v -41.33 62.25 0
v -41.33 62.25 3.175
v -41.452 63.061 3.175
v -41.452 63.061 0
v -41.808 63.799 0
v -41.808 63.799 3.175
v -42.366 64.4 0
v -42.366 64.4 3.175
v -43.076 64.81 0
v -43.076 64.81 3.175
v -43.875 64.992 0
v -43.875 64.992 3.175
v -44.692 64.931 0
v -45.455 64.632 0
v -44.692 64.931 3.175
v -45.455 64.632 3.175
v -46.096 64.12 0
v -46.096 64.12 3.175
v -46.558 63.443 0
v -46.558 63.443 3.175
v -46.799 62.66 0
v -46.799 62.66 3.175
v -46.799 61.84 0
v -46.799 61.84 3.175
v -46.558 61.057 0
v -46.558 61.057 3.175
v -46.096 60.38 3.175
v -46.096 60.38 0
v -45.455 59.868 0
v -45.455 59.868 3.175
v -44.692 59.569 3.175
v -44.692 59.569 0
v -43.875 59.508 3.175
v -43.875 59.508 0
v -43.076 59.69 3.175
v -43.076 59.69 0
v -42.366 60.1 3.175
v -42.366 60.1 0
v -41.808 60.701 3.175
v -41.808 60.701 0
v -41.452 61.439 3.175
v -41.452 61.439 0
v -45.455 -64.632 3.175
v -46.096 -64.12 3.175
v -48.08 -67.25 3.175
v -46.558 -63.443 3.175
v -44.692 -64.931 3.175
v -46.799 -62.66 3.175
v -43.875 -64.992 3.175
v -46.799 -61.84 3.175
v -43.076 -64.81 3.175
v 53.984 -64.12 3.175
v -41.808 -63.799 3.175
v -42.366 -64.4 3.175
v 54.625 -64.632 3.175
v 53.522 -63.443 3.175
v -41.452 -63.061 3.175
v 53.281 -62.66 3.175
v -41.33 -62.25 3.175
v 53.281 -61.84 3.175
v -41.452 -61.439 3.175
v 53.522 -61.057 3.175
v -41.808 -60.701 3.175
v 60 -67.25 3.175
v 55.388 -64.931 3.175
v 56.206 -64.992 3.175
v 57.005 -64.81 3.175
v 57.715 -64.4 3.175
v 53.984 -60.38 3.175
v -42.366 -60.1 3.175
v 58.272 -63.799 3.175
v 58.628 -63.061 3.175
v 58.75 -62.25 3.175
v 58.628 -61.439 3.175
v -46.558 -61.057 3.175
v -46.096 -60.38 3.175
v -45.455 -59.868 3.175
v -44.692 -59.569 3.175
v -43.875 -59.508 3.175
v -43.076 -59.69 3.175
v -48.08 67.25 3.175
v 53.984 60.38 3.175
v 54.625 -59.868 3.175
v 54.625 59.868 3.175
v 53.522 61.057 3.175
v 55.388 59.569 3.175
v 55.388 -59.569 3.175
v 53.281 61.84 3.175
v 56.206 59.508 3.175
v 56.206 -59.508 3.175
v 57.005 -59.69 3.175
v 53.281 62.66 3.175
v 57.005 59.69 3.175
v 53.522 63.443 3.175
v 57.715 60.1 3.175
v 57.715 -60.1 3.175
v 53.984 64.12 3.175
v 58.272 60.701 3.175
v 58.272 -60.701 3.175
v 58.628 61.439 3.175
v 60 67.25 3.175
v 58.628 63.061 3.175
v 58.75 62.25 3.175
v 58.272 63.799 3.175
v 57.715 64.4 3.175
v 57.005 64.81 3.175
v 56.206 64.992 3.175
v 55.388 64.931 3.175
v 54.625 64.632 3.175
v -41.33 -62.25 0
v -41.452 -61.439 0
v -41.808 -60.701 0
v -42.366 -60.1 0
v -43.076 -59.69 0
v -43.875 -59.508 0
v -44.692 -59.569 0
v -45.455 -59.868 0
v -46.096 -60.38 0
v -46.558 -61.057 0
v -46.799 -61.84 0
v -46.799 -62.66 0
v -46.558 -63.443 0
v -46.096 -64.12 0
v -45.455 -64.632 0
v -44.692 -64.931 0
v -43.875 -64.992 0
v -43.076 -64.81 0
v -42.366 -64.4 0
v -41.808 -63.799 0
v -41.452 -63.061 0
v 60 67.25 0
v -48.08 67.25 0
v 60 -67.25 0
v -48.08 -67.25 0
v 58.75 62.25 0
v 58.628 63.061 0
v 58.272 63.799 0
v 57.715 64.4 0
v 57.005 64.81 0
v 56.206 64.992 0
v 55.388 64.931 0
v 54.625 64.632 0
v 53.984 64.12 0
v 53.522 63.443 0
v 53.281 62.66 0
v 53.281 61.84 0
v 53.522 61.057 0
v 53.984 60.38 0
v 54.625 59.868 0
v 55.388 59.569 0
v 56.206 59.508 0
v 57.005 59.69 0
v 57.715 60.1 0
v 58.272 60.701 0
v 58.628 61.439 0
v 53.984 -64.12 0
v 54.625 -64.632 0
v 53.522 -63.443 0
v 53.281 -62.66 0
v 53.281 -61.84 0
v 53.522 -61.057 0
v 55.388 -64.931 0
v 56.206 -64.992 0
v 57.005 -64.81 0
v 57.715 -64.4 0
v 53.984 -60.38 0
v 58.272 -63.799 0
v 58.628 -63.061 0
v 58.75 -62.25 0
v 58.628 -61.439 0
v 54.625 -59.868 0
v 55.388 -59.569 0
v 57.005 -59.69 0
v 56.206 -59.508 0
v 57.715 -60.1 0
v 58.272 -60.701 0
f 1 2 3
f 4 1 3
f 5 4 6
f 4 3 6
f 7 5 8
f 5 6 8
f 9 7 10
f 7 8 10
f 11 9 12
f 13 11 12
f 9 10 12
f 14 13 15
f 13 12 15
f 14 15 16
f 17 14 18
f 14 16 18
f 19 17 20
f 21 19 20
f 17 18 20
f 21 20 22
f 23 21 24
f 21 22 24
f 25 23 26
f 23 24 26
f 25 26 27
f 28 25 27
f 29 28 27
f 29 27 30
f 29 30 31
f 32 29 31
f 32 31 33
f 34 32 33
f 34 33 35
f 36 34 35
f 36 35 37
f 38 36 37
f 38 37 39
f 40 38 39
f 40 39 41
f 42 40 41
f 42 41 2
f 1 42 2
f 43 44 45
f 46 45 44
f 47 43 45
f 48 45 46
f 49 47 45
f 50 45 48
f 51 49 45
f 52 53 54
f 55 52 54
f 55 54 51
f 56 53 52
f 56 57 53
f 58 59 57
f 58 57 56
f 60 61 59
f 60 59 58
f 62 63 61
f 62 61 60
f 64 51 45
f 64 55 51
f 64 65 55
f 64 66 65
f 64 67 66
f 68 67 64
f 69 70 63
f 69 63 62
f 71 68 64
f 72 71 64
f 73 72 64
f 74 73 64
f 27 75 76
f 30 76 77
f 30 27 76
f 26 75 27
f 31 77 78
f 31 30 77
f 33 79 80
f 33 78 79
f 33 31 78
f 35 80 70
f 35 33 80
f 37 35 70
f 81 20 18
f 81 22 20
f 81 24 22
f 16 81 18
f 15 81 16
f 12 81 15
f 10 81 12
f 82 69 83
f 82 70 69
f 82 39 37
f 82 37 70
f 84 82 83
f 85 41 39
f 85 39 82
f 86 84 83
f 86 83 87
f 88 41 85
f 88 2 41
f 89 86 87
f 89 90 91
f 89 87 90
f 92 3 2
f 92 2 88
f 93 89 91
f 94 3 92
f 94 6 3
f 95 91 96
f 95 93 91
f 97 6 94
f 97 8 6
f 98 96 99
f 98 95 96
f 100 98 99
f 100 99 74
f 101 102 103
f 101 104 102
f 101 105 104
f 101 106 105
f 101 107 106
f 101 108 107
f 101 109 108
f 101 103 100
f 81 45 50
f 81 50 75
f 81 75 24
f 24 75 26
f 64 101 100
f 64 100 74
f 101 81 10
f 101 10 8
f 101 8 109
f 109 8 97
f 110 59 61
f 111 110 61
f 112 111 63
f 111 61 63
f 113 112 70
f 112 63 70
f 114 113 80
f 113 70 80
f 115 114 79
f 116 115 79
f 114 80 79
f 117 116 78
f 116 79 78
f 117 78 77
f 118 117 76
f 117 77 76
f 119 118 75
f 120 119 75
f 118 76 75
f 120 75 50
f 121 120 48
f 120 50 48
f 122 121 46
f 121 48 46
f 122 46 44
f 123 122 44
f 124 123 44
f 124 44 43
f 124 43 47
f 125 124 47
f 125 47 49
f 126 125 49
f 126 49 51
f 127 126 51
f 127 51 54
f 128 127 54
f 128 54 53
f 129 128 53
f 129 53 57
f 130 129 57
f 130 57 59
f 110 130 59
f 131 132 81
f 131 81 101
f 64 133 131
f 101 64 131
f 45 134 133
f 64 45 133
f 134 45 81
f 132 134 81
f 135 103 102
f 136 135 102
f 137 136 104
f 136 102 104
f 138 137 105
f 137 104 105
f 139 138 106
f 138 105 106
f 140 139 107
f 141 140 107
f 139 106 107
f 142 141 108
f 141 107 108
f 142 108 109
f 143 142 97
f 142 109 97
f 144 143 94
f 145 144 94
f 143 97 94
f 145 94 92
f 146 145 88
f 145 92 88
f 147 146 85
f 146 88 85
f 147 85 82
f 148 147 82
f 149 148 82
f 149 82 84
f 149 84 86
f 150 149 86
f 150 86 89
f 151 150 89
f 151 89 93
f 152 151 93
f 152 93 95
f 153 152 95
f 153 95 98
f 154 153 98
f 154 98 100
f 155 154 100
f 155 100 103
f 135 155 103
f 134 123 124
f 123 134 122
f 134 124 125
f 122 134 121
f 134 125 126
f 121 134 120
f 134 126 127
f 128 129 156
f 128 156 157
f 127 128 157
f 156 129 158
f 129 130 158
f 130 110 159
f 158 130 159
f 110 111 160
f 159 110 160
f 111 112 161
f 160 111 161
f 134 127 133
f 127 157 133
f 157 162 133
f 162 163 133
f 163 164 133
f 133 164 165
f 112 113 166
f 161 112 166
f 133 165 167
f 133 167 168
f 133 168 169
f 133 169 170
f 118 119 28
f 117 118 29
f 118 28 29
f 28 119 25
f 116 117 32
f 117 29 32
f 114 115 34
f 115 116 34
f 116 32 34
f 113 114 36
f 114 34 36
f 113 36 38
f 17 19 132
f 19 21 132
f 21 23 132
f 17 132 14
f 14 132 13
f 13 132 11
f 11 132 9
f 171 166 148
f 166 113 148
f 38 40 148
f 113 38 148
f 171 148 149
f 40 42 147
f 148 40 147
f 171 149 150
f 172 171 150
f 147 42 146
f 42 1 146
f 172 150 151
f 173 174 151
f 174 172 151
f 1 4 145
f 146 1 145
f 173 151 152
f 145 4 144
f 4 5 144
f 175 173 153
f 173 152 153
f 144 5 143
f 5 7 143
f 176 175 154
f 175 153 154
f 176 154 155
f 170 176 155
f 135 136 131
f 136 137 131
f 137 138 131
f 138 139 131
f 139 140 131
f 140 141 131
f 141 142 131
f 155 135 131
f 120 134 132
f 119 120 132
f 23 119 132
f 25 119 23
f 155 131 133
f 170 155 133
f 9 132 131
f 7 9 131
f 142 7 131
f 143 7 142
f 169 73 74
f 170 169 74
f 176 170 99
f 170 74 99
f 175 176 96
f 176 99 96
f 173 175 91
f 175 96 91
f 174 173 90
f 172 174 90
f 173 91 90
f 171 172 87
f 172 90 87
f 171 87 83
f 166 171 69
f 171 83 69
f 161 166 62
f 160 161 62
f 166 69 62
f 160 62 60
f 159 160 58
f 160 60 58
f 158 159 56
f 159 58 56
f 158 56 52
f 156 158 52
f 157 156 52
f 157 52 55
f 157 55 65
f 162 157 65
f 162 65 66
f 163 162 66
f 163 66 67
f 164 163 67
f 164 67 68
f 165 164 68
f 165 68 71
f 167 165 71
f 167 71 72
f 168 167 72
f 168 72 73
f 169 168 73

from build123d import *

# Parameters (mm, degrees)
SKETCH1_W           = 120
SKETCH1_H           = 134.5
BOSS_EXTRUDE1_DEPTH = 3.175
CUT_EXTRUDE1_REACH  = 92.181
SKETCH2_W           = 11.91979388
SKETCH2_H           = 134.5
SKETCH2_R           = 2.75


with BuildPart() as part:
    # Sketch1 → Boss-Extrude1 (new body)
    with BuildSketch(Plane.XY):
        Rectangle(SKETCH1_W, SKETCH1_H)
    extrude(amount=BOSS_EXTRUDE1_DEPTH)

    # Sketch2 → Cut-Extrude1 (cut, up to next)
    with BuildSketch(Plane.XY.offset(3.175), mode=Mode.PRIVATE) as cut_extrude1_sk1:
        with Locations((-54.04010306, 0)):
            Rectangle(SKETCH2_W, SKETCH2_H)
    cut_extrude1_tool1 = extrude(cut_extrude1_sk1.sketch, amount=-CUT_EXTRUDE1_REACH, mode=Mode.PRIVATE) & part.part
    # Sketch2 → Cut-Extrude1 (cut, up to next)
    with BuildSketch(Plane.XY.offset(3.175), mode=Mode.PRIVATE) as cut_extrude1_sk2:
        with Locations((-44.08020612, 62.25)):
            Circle(SKETCH2_R)
    cut_extrude1_tool2 = extrude(cut_extrude1_sk2.sketch, amount=-CUT_EXTRUDE1_REACH, mode=Mode.PRIVATE) & part.part
    # Sketch2 → Cut-Extrude1 (cut, up to next)
    with BuildSketch(Plane.XY.offset(3.175), mode=Mode.PRIVATE) as cut_extrude1_sk3:
        with Locations((56, -62.25)):
            Circle(SKETCH2_R)
    cut_extrude1_tool3 = extrude(cut_extrude1_sk3.sketch, amount=-CUT_EXTRUDE1_REACH, mode=Mode.PRIVATE) & part.part
    # Sketch2 → Cut-Extrude1 (cut, up to next)
    with BuildSketch(Plane.XY.offset(3.175), mode=Mode.PRIVATE) as cut_extrude1_sk4:
        with Locations((-44.08020612, -62.25)):
            Circle(SKETCH2_R)
    cut_extrude1_tool4 = extrude(cut_extrude1_sk4.sketch, amount=-CUT_EXTRUDE1_REACH, mode=Mode.PRIVATE) & part.part
    # Sketch2 → Cut-Extrude1 (cut, up to next)
    with BuildSketch(Plane.XY.offset(3.175), mode=Mode.PRIVATE) as cut_extrude1_sk5:
        with Locations((56, 62.25)):
            Circle(SKETCH2_R)
    cut_extrude1_tool5 = extrude(cut_extrude1_sk5.sketch, amount=-CUT_EXTRUDE1_REACH, mode=Mode.PRIVATE) & part.part
    add(cut_extrude1_tool1.solids().sort_by_distance((-54.040103, 0, 3.175))[0], mode=Mode.SUBTRACT)
    add(cut_extrude1_tool2.solids().sort_by_distance((-44.080206, 62.25, 3.175))[0], mode=Mode.SUBTRACT)
    add(cut_extrude1_tool3.solids().sort_by_distance((56, -62.25, 3.175))[0], mode=Mode.SUBTRACT)
    add(cut_extrude1_tool4.solids().sort_by_distance((-44.080206, -62.25, 3.175))[0], mode=Mode.SUBTRACT)
    add(cut_extrude1_tool5.solids().sort_by_distance((56, 62.25, 3.175))[0], mode=Mode.SUBTRACT)


solid = part.part
